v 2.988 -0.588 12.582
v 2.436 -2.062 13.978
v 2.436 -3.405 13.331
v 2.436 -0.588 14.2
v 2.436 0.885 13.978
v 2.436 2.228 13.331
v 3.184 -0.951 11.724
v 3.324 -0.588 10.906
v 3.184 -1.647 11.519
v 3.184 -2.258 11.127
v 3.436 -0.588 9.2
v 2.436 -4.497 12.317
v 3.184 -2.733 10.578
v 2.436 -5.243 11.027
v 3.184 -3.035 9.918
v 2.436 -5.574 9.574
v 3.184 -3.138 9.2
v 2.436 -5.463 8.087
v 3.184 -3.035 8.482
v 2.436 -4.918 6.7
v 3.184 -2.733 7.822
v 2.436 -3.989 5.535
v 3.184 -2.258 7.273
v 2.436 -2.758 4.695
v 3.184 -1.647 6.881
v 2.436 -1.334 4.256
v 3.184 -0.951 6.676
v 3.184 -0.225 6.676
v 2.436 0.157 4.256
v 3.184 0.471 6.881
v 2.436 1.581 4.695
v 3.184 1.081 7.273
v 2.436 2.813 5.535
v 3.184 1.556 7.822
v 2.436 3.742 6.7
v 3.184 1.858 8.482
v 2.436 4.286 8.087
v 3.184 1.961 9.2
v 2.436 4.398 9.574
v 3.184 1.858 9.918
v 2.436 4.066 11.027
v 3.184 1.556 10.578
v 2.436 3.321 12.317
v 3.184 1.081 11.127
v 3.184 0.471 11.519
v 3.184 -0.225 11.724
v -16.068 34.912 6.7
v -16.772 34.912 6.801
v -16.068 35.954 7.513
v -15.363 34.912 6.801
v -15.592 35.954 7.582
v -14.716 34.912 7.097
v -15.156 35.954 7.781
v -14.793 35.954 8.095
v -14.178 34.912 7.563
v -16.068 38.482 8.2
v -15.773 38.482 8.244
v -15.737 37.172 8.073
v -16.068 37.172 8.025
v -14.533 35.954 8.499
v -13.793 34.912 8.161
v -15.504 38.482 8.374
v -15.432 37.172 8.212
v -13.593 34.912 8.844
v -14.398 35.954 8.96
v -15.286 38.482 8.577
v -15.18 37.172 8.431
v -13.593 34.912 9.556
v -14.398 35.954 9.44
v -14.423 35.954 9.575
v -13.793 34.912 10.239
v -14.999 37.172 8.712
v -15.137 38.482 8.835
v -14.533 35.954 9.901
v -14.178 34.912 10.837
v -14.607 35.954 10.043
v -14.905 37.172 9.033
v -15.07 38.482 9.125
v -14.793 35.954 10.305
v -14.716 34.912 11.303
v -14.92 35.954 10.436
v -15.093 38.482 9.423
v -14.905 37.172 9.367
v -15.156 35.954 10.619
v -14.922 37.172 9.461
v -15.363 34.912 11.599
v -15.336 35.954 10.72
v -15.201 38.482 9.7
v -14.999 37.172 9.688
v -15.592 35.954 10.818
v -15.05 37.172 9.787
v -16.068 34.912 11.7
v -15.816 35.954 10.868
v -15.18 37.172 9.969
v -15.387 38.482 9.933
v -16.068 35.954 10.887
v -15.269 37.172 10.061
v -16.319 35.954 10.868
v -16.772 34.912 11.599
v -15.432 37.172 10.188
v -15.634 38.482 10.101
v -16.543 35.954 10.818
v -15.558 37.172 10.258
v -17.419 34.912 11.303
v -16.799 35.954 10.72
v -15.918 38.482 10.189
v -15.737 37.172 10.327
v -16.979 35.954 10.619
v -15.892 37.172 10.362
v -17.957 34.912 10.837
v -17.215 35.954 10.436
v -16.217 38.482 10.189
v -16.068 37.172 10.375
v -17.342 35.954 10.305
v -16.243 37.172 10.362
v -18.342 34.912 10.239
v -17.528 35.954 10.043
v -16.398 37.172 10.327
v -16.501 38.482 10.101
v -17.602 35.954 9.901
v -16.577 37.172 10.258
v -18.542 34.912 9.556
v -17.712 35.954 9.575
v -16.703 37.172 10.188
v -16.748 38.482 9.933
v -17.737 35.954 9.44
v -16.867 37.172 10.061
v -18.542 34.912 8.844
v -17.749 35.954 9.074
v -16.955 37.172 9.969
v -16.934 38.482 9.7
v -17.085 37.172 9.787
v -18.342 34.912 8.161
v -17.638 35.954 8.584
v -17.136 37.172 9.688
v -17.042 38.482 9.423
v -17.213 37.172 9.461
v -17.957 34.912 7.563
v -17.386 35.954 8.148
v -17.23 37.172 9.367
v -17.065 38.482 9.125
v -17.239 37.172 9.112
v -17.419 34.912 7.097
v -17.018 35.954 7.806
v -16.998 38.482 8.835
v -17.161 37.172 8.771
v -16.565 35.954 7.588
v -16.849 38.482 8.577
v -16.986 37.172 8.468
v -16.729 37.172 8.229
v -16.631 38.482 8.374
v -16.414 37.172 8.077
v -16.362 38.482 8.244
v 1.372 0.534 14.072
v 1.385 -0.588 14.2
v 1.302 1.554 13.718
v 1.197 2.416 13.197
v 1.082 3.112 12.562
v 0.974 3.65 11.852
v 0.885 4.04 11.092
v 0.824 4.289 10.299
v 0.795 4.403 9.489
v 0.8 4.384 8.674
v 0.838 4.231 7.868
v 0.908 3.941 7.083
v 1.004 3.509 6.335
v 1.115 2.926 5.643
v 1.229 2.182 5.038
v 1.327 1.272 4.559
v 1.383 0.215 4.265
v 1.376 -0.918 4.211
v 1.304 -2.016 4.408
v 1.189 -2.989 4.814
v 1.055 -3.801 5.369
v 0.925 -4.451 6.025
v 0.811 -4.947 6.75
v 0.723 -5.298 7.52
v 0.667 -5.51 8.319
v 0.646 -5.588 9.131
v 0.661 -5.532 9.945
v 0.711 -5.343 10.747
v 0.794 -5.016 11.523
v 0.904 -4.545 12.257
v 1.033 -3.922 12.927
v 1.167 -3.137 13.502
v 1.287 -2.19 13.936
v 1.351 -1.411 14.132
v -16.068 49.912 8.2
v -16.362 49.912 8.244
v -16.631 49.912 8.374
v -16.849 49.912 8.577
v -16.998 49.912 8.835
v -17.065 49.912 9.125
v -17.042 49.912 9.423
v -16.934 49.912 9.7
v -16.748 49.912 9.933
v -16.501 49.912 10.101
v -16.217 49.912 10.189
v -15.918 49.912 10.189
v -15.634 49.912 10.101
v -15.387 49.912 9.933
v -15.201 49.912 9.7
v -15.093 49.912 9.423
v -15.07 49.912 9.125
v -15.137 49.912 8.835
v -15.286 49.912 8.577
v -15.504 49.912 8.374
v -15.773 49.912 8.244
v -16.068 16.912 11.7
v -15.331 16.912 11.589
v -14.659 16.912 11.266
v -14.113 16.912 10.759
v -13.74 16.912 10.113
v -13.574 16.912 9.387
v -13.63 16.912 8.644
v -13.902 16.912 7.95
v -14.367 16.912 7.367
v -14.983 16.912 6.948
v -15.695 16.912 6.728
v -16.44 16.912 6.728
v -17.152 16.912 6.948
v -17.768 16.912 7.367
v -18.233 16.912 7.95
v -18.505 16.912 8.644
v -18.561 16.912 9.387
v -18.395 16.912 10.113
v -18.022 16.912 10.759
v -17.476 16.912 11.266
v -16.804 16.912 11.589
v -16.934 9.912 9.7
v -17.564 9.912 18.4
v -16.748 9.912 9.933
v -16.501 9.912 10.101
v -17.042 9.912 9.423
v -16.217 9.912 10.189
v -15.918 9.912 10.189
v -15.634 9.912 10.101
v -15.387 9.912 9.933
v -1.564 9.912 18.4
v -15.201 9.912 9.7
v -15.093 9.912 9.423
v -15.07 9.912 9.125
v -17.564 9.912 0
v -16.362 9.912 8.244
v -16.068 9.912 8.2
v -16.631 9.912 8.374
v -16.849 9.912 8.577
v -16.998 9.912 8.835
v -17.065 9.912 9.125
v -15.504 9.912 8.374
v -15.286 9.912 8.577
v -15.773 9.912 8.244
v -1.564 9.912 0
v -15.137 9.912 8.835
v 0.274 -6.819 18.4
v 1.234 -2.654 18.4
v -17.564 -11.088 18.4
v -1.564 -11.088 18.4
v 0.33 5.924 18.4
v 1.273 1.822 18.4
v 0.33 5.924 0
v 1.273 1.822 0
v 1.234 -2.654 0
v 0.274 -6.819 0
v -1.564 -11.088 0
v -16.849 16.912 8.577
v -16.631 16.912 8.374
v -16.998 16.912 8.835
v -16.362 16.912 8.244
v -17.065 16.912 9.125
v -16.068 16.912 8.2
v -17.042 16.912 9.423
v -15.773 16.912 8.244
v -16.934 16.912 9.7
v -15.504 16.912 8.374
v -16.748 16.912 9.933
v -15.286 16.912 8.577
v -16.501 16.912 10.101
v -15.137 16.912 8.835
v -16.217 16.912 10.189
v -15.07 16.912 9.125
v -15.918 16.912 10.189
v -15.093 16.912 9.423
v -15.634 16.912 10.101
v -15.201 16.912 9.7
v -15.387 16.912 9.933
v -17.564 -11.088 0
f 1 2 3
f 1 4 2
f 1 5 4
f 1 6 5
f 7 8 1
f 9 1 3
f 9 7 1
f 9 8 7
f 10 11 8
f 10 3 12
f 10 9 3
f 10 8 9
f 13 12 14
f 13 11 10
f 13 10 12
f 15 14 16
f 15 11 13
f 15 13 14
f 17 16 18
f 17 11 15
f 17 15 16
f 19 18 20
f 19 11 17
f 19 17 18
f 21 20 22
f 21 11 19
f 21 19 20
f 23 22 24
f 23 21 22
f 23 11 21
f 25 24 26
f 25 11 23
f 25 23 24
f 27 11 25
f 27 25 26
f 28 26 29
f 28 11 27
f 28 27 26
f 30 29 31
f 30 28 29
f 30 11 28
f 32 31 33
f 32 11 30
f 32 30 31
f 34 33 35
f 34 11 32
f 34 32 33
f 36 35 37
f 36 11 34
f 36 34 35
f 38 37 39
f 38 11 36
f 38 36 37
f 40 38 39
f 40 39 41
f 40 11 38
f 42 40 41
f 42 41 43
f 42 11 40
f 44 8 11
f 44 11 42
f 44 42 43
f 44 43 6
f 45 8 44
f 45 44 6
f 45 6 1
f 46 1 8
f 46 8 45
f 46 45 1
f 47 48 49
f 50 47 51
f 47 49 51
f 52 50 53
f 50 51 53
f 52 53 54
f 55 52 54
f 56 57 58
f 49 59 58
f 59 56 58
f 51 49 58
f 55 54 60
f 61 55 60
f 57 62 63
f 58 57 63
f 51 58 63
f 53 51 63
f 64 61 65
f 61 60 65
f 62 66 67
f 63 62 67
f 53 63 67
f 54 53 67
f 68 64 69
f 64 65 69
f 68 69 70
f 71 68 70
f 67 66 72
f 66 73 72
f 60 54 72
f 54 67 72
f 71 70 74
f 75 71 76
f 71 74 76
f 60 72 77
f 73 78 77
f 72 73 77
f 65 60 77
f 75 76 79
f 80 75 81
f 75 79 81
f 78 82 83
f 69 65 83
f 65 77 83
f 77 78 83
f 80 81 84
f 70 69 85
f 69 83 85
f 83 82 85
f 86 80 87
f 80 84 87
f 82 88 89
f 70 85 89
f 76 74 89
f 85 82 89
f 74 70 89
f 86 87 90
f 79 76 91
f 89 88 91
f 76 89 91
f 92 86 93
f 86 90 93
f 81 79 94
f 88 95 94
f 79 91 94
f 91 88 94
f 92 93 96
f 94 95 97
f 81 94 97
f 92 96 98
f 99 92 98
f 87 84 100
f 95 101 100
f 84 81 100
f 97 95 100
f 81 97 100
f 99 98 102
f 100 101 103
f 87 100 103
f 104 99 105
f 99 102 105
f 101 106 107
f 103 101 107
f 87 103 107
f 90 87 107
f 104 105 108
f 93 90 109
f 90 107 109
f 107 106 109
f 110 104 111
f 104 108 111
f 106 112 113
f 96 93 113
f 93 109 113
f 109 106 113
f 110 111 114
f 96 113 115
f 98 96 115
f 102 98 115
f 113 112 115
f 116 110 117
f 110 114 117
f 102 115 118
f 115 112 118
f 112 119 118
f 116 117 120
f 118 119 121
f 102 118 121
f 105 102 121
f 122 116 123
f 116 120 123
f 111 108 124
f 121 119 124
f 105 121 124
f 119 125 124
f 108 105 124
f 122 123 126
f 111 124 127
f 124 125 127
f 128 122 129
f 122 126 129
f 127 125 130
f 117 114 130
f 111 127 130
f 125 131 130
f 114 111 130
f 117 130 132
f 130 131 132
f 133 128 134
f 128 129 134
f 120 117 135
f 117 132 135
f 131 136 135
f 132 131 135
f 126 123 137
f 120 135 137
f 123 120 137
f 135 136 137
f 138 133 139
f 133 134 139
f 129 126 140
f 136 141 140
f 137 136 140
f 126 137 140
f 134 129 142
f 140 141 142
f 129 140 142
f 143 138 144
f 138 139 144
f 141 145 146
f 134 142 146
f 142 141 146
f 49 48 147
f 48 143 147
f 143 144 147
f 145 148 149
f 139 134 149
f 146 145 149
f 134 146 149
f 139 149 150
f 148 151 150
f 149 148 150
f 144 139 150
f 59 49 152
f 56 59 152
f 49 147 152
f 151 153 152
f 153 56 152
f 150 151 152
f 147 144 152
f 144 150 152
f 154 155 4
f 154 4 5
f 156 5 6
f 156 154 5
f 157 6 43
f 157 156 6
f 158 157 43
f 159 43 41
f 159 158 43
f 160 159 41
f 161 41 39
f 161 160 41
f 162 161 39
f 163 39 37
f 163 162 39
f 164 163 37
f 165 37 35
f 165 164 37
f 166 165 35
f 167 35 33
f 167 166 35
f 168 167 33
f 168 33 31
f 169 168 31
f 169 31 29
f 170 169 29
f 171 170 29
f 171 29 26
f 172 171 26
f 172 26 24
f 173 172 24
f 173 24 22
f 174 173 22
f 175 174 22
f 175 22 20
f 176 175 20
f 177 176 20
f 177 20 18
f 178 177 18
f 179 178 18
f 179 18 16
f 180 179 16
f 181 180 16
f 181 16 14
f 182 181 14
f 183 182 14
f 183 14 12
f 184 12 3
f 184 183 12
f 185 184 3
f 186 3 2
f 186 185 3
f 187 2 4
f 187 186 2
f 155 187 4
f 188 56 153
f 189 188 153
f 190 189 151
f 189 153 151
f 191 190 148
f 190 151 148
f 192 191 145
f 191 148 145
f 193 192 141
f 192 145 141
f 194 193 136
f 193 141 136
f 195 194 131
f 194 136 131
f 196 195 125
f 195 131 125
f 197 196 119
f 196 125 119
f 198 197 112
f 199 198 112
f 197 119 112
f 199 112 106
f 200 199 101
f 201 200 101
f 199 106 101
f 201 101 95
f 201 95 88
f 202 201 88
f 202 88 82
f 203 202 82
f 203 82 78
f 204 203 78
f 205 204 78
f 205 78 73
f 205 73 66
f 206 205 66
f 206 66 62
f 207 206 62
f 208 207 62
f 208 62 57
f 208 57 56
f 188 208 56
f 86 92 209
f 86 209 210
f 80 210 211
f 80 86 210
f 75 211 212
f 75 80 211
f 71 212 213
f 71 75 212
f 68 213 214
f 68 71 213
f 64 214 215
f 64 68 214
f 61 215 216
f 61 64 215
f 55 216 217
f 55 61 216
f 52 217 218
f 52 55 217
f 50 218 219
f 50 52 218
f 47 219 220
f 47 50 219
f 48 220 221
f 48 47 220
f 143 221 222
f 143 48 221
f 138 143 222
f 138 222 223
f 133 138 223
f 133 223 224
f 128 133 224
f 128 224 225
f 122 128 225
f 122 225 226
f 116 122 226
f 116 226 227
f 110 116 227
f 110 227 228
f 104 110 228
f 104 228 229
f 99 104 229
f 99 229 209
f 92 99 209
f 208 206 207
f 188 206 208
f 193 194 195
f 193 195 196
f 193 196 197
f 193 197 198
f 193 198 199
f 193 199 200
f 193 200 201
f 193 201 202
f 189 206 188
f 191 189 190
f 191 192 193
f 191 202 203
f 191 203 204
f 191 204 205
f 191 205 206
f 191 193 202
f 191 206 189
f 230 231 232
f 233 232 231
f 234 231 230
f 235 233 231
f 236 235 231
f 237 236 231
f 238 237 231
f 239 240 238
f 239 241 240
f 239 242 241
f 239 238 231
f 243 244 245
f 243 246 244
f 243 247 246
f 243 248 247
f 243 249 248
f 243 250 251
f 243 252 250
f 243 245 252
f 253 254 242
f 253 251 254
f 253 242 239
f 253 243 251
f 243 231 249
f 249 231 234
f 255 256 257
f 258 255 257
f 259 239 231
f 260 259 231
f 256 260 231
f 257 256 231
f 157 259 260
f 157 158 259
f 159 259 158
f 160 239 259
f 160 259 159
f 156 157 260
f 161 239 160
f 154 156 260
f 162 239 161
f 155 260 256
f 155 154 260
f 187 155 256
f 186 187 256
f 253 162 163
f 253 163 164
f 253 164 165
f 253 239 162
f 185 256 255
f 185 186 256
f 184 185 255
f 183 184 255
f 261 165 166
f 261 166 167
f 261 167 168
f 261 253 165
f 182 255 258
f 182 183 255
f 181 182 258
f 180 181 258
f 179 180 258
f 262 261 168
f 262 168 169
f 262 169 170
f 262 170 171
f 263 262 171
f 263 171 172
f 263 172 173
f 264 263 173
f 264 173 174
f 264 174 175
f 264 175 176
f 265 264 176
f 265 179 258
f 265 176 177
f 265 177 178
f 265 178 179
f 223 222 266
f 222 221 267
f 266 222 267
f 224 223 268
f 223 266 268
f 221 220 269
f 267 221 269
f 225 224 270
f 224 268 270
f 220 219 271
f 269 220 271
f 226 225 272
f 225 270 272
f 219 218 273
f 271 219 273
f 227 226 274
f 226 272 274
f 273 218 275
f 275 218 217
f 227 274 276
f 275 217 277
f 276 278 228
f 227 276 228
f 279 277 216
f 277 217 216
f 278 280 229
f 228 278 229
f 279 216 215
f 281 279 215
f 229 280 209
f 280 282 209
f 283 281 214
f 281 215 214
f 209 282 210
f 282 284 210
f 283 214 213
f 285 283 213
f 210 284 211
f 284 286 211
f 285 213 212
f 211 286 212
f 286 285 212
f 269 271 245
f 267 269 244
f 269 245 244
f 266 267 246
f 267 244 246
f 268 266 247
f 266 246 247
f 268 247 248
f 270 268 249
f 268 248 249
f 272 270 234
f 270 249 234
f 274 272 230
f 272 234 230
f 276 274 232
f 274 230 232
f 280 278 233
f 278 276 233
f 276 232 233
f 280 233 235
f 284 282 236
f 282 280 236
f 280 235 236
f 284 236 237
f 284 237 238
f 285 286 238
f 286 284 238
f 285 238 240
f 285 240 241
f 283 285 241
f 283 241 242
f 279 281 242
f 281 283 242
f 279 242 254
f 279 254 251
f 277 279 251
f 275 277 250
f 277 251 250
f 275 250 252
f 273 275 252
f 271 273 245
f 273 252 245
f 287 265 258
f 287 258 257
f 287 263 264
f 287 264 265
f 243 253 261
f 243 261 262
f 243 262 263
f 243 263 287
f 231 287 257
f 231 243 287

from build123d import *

# Parameters (mm, degrees)
BOSS_EXTRUDE1_DEPTH = 18.4
SKETCH2_R           = 5
BOSS_EXTRUDE2_DEPTH = 20
DOME1_FACE_RADIUS   = 5
DOME1_HEIGHT        = 1
SKETCH3_R           = 1
BOSS_EXTRUDE3_DEPTH = 40
BOSS_EXTRUDE4_START = -15
SKETCH4_R           = 2.5
BOSS_EXTRUDE4_DEPTH = 18
FILLET1_R           = 5


with BuildPart() as part:
    # Sketch1 → Boss-Extrude1 (new body)
    with BuildSketch(Plane.XY):
        with BuildLine():
            Line((-17.563883718, 9.91167305), (-1.563883718, 9.91167305))
            add(Edge.make_bspline(
                [(-1.563883718, 9.91167305), (4.3404042, 0.119497618), (-1.563883718, -11.08832695)],
                knots=[0, 0, 0, 1, 1, 1], degree=2))
            Line((-1.563883718, -11.08832695), (-17.563883718, -11.08832695))
            Line((-17.563883718, -11.08832695), (-17.563883718, 9.91167305))
        make_face()
    extrude(amount=BOSS_EXTRUDE1_DEPTH)

    # Sketch2 → Boss-Extrude2 (add)
    with BuildSketch(Plane.ZY.offset(17.563883718)):
        with Locations((9.2, -0.58832695)):
            Circle(SKETCH2_R)
    extrude(amount=-BOSS_EXTRUDE2_DEPTH)

    # Dome1: a dome of height H over a round flat face of radius A is a cap of a sphere of radius (A * A + H * H) / (2 * H)
    dome1_r = (DOME1_FACE_RADIUS * DOME1_FACE_RADIUS + DOME1_HEIGHT * DOME1_HEIGHT) / (2 * DOME1_HEIGHT)
    dome1_base = Plane((2.436116282, -0.58832695, 9.2), z_dir=(1, 0, 0))
    with Locations(dome1_base.offset(DOME1_HEIGHT - dome1_r)):
        dome1_ball = Sphere(dome1_r, mode=Mode.PRIVATE)
    add(split(dome1_ball, bisect_by=dome1_base, keep=Keep.TOP, mode=Mode.PRIVATE))

    # Sketch3 → Boss-Extrude3 (add)
    with BuildSketch(Plane(origin=(0, 9.91167305, 0), x_dir=(1, 0, 0), z_dir=(0, 1, 0))):
        with Locations(Location((-16.067507499, -9.2, 0), (0, 0, 90))):
            Circle(SKETCH3_R)
    extrude(amount=BOSS_EXTRUDE3_DEPTH)

    # Sketch4 → Boss-Extrude4 (add)
    with BuildSketch(Plane(origin=(0, 49.91167305, 0), x_dir=(1, 0, 0), z_dir=(0, 1, 0)).offset(BOSS_EXTRUDE4_START)):
        with Locations(Location((-16.067507499, -9.2, 0), (0, 0, 270))):
            Circle(SKETCH4_R)
    extrude(amount=-BOSS_EXTRUDE4_DEPTH)

    # Fillet1
    # the kernel refuses this fillet: 5 mm, written as the material it adds along each edge
    with BuildSketch(Plane(origin=(-16.067507499, 34.91167305, 9.2), x_dir=(0, 0, -1), z_dir=(-1, 0, 0))) as fillet1_piece_1:
        with BuildLine():
            CenterArc((6, -3.570714214), FILLET1_R, 134.427004001, 45.572995999)
            Line((1, -3.570714214), (0.9, -3.570714214))
            Line((0.9, -3.570714214), (0.9, 0))
            Line((0.9, 0), (1, 0.1))
            ThreePointArc((1, 0.1), (1.75, 0.1), (2.43, 0.071414284))
            Line((2.43, 0.071414284), (2.5, 0))
        make_face()
    revolve(axis=Axis((-16.067507499, 34.91167305, 9.2), (0, -1, 0)))


solid = part.part
